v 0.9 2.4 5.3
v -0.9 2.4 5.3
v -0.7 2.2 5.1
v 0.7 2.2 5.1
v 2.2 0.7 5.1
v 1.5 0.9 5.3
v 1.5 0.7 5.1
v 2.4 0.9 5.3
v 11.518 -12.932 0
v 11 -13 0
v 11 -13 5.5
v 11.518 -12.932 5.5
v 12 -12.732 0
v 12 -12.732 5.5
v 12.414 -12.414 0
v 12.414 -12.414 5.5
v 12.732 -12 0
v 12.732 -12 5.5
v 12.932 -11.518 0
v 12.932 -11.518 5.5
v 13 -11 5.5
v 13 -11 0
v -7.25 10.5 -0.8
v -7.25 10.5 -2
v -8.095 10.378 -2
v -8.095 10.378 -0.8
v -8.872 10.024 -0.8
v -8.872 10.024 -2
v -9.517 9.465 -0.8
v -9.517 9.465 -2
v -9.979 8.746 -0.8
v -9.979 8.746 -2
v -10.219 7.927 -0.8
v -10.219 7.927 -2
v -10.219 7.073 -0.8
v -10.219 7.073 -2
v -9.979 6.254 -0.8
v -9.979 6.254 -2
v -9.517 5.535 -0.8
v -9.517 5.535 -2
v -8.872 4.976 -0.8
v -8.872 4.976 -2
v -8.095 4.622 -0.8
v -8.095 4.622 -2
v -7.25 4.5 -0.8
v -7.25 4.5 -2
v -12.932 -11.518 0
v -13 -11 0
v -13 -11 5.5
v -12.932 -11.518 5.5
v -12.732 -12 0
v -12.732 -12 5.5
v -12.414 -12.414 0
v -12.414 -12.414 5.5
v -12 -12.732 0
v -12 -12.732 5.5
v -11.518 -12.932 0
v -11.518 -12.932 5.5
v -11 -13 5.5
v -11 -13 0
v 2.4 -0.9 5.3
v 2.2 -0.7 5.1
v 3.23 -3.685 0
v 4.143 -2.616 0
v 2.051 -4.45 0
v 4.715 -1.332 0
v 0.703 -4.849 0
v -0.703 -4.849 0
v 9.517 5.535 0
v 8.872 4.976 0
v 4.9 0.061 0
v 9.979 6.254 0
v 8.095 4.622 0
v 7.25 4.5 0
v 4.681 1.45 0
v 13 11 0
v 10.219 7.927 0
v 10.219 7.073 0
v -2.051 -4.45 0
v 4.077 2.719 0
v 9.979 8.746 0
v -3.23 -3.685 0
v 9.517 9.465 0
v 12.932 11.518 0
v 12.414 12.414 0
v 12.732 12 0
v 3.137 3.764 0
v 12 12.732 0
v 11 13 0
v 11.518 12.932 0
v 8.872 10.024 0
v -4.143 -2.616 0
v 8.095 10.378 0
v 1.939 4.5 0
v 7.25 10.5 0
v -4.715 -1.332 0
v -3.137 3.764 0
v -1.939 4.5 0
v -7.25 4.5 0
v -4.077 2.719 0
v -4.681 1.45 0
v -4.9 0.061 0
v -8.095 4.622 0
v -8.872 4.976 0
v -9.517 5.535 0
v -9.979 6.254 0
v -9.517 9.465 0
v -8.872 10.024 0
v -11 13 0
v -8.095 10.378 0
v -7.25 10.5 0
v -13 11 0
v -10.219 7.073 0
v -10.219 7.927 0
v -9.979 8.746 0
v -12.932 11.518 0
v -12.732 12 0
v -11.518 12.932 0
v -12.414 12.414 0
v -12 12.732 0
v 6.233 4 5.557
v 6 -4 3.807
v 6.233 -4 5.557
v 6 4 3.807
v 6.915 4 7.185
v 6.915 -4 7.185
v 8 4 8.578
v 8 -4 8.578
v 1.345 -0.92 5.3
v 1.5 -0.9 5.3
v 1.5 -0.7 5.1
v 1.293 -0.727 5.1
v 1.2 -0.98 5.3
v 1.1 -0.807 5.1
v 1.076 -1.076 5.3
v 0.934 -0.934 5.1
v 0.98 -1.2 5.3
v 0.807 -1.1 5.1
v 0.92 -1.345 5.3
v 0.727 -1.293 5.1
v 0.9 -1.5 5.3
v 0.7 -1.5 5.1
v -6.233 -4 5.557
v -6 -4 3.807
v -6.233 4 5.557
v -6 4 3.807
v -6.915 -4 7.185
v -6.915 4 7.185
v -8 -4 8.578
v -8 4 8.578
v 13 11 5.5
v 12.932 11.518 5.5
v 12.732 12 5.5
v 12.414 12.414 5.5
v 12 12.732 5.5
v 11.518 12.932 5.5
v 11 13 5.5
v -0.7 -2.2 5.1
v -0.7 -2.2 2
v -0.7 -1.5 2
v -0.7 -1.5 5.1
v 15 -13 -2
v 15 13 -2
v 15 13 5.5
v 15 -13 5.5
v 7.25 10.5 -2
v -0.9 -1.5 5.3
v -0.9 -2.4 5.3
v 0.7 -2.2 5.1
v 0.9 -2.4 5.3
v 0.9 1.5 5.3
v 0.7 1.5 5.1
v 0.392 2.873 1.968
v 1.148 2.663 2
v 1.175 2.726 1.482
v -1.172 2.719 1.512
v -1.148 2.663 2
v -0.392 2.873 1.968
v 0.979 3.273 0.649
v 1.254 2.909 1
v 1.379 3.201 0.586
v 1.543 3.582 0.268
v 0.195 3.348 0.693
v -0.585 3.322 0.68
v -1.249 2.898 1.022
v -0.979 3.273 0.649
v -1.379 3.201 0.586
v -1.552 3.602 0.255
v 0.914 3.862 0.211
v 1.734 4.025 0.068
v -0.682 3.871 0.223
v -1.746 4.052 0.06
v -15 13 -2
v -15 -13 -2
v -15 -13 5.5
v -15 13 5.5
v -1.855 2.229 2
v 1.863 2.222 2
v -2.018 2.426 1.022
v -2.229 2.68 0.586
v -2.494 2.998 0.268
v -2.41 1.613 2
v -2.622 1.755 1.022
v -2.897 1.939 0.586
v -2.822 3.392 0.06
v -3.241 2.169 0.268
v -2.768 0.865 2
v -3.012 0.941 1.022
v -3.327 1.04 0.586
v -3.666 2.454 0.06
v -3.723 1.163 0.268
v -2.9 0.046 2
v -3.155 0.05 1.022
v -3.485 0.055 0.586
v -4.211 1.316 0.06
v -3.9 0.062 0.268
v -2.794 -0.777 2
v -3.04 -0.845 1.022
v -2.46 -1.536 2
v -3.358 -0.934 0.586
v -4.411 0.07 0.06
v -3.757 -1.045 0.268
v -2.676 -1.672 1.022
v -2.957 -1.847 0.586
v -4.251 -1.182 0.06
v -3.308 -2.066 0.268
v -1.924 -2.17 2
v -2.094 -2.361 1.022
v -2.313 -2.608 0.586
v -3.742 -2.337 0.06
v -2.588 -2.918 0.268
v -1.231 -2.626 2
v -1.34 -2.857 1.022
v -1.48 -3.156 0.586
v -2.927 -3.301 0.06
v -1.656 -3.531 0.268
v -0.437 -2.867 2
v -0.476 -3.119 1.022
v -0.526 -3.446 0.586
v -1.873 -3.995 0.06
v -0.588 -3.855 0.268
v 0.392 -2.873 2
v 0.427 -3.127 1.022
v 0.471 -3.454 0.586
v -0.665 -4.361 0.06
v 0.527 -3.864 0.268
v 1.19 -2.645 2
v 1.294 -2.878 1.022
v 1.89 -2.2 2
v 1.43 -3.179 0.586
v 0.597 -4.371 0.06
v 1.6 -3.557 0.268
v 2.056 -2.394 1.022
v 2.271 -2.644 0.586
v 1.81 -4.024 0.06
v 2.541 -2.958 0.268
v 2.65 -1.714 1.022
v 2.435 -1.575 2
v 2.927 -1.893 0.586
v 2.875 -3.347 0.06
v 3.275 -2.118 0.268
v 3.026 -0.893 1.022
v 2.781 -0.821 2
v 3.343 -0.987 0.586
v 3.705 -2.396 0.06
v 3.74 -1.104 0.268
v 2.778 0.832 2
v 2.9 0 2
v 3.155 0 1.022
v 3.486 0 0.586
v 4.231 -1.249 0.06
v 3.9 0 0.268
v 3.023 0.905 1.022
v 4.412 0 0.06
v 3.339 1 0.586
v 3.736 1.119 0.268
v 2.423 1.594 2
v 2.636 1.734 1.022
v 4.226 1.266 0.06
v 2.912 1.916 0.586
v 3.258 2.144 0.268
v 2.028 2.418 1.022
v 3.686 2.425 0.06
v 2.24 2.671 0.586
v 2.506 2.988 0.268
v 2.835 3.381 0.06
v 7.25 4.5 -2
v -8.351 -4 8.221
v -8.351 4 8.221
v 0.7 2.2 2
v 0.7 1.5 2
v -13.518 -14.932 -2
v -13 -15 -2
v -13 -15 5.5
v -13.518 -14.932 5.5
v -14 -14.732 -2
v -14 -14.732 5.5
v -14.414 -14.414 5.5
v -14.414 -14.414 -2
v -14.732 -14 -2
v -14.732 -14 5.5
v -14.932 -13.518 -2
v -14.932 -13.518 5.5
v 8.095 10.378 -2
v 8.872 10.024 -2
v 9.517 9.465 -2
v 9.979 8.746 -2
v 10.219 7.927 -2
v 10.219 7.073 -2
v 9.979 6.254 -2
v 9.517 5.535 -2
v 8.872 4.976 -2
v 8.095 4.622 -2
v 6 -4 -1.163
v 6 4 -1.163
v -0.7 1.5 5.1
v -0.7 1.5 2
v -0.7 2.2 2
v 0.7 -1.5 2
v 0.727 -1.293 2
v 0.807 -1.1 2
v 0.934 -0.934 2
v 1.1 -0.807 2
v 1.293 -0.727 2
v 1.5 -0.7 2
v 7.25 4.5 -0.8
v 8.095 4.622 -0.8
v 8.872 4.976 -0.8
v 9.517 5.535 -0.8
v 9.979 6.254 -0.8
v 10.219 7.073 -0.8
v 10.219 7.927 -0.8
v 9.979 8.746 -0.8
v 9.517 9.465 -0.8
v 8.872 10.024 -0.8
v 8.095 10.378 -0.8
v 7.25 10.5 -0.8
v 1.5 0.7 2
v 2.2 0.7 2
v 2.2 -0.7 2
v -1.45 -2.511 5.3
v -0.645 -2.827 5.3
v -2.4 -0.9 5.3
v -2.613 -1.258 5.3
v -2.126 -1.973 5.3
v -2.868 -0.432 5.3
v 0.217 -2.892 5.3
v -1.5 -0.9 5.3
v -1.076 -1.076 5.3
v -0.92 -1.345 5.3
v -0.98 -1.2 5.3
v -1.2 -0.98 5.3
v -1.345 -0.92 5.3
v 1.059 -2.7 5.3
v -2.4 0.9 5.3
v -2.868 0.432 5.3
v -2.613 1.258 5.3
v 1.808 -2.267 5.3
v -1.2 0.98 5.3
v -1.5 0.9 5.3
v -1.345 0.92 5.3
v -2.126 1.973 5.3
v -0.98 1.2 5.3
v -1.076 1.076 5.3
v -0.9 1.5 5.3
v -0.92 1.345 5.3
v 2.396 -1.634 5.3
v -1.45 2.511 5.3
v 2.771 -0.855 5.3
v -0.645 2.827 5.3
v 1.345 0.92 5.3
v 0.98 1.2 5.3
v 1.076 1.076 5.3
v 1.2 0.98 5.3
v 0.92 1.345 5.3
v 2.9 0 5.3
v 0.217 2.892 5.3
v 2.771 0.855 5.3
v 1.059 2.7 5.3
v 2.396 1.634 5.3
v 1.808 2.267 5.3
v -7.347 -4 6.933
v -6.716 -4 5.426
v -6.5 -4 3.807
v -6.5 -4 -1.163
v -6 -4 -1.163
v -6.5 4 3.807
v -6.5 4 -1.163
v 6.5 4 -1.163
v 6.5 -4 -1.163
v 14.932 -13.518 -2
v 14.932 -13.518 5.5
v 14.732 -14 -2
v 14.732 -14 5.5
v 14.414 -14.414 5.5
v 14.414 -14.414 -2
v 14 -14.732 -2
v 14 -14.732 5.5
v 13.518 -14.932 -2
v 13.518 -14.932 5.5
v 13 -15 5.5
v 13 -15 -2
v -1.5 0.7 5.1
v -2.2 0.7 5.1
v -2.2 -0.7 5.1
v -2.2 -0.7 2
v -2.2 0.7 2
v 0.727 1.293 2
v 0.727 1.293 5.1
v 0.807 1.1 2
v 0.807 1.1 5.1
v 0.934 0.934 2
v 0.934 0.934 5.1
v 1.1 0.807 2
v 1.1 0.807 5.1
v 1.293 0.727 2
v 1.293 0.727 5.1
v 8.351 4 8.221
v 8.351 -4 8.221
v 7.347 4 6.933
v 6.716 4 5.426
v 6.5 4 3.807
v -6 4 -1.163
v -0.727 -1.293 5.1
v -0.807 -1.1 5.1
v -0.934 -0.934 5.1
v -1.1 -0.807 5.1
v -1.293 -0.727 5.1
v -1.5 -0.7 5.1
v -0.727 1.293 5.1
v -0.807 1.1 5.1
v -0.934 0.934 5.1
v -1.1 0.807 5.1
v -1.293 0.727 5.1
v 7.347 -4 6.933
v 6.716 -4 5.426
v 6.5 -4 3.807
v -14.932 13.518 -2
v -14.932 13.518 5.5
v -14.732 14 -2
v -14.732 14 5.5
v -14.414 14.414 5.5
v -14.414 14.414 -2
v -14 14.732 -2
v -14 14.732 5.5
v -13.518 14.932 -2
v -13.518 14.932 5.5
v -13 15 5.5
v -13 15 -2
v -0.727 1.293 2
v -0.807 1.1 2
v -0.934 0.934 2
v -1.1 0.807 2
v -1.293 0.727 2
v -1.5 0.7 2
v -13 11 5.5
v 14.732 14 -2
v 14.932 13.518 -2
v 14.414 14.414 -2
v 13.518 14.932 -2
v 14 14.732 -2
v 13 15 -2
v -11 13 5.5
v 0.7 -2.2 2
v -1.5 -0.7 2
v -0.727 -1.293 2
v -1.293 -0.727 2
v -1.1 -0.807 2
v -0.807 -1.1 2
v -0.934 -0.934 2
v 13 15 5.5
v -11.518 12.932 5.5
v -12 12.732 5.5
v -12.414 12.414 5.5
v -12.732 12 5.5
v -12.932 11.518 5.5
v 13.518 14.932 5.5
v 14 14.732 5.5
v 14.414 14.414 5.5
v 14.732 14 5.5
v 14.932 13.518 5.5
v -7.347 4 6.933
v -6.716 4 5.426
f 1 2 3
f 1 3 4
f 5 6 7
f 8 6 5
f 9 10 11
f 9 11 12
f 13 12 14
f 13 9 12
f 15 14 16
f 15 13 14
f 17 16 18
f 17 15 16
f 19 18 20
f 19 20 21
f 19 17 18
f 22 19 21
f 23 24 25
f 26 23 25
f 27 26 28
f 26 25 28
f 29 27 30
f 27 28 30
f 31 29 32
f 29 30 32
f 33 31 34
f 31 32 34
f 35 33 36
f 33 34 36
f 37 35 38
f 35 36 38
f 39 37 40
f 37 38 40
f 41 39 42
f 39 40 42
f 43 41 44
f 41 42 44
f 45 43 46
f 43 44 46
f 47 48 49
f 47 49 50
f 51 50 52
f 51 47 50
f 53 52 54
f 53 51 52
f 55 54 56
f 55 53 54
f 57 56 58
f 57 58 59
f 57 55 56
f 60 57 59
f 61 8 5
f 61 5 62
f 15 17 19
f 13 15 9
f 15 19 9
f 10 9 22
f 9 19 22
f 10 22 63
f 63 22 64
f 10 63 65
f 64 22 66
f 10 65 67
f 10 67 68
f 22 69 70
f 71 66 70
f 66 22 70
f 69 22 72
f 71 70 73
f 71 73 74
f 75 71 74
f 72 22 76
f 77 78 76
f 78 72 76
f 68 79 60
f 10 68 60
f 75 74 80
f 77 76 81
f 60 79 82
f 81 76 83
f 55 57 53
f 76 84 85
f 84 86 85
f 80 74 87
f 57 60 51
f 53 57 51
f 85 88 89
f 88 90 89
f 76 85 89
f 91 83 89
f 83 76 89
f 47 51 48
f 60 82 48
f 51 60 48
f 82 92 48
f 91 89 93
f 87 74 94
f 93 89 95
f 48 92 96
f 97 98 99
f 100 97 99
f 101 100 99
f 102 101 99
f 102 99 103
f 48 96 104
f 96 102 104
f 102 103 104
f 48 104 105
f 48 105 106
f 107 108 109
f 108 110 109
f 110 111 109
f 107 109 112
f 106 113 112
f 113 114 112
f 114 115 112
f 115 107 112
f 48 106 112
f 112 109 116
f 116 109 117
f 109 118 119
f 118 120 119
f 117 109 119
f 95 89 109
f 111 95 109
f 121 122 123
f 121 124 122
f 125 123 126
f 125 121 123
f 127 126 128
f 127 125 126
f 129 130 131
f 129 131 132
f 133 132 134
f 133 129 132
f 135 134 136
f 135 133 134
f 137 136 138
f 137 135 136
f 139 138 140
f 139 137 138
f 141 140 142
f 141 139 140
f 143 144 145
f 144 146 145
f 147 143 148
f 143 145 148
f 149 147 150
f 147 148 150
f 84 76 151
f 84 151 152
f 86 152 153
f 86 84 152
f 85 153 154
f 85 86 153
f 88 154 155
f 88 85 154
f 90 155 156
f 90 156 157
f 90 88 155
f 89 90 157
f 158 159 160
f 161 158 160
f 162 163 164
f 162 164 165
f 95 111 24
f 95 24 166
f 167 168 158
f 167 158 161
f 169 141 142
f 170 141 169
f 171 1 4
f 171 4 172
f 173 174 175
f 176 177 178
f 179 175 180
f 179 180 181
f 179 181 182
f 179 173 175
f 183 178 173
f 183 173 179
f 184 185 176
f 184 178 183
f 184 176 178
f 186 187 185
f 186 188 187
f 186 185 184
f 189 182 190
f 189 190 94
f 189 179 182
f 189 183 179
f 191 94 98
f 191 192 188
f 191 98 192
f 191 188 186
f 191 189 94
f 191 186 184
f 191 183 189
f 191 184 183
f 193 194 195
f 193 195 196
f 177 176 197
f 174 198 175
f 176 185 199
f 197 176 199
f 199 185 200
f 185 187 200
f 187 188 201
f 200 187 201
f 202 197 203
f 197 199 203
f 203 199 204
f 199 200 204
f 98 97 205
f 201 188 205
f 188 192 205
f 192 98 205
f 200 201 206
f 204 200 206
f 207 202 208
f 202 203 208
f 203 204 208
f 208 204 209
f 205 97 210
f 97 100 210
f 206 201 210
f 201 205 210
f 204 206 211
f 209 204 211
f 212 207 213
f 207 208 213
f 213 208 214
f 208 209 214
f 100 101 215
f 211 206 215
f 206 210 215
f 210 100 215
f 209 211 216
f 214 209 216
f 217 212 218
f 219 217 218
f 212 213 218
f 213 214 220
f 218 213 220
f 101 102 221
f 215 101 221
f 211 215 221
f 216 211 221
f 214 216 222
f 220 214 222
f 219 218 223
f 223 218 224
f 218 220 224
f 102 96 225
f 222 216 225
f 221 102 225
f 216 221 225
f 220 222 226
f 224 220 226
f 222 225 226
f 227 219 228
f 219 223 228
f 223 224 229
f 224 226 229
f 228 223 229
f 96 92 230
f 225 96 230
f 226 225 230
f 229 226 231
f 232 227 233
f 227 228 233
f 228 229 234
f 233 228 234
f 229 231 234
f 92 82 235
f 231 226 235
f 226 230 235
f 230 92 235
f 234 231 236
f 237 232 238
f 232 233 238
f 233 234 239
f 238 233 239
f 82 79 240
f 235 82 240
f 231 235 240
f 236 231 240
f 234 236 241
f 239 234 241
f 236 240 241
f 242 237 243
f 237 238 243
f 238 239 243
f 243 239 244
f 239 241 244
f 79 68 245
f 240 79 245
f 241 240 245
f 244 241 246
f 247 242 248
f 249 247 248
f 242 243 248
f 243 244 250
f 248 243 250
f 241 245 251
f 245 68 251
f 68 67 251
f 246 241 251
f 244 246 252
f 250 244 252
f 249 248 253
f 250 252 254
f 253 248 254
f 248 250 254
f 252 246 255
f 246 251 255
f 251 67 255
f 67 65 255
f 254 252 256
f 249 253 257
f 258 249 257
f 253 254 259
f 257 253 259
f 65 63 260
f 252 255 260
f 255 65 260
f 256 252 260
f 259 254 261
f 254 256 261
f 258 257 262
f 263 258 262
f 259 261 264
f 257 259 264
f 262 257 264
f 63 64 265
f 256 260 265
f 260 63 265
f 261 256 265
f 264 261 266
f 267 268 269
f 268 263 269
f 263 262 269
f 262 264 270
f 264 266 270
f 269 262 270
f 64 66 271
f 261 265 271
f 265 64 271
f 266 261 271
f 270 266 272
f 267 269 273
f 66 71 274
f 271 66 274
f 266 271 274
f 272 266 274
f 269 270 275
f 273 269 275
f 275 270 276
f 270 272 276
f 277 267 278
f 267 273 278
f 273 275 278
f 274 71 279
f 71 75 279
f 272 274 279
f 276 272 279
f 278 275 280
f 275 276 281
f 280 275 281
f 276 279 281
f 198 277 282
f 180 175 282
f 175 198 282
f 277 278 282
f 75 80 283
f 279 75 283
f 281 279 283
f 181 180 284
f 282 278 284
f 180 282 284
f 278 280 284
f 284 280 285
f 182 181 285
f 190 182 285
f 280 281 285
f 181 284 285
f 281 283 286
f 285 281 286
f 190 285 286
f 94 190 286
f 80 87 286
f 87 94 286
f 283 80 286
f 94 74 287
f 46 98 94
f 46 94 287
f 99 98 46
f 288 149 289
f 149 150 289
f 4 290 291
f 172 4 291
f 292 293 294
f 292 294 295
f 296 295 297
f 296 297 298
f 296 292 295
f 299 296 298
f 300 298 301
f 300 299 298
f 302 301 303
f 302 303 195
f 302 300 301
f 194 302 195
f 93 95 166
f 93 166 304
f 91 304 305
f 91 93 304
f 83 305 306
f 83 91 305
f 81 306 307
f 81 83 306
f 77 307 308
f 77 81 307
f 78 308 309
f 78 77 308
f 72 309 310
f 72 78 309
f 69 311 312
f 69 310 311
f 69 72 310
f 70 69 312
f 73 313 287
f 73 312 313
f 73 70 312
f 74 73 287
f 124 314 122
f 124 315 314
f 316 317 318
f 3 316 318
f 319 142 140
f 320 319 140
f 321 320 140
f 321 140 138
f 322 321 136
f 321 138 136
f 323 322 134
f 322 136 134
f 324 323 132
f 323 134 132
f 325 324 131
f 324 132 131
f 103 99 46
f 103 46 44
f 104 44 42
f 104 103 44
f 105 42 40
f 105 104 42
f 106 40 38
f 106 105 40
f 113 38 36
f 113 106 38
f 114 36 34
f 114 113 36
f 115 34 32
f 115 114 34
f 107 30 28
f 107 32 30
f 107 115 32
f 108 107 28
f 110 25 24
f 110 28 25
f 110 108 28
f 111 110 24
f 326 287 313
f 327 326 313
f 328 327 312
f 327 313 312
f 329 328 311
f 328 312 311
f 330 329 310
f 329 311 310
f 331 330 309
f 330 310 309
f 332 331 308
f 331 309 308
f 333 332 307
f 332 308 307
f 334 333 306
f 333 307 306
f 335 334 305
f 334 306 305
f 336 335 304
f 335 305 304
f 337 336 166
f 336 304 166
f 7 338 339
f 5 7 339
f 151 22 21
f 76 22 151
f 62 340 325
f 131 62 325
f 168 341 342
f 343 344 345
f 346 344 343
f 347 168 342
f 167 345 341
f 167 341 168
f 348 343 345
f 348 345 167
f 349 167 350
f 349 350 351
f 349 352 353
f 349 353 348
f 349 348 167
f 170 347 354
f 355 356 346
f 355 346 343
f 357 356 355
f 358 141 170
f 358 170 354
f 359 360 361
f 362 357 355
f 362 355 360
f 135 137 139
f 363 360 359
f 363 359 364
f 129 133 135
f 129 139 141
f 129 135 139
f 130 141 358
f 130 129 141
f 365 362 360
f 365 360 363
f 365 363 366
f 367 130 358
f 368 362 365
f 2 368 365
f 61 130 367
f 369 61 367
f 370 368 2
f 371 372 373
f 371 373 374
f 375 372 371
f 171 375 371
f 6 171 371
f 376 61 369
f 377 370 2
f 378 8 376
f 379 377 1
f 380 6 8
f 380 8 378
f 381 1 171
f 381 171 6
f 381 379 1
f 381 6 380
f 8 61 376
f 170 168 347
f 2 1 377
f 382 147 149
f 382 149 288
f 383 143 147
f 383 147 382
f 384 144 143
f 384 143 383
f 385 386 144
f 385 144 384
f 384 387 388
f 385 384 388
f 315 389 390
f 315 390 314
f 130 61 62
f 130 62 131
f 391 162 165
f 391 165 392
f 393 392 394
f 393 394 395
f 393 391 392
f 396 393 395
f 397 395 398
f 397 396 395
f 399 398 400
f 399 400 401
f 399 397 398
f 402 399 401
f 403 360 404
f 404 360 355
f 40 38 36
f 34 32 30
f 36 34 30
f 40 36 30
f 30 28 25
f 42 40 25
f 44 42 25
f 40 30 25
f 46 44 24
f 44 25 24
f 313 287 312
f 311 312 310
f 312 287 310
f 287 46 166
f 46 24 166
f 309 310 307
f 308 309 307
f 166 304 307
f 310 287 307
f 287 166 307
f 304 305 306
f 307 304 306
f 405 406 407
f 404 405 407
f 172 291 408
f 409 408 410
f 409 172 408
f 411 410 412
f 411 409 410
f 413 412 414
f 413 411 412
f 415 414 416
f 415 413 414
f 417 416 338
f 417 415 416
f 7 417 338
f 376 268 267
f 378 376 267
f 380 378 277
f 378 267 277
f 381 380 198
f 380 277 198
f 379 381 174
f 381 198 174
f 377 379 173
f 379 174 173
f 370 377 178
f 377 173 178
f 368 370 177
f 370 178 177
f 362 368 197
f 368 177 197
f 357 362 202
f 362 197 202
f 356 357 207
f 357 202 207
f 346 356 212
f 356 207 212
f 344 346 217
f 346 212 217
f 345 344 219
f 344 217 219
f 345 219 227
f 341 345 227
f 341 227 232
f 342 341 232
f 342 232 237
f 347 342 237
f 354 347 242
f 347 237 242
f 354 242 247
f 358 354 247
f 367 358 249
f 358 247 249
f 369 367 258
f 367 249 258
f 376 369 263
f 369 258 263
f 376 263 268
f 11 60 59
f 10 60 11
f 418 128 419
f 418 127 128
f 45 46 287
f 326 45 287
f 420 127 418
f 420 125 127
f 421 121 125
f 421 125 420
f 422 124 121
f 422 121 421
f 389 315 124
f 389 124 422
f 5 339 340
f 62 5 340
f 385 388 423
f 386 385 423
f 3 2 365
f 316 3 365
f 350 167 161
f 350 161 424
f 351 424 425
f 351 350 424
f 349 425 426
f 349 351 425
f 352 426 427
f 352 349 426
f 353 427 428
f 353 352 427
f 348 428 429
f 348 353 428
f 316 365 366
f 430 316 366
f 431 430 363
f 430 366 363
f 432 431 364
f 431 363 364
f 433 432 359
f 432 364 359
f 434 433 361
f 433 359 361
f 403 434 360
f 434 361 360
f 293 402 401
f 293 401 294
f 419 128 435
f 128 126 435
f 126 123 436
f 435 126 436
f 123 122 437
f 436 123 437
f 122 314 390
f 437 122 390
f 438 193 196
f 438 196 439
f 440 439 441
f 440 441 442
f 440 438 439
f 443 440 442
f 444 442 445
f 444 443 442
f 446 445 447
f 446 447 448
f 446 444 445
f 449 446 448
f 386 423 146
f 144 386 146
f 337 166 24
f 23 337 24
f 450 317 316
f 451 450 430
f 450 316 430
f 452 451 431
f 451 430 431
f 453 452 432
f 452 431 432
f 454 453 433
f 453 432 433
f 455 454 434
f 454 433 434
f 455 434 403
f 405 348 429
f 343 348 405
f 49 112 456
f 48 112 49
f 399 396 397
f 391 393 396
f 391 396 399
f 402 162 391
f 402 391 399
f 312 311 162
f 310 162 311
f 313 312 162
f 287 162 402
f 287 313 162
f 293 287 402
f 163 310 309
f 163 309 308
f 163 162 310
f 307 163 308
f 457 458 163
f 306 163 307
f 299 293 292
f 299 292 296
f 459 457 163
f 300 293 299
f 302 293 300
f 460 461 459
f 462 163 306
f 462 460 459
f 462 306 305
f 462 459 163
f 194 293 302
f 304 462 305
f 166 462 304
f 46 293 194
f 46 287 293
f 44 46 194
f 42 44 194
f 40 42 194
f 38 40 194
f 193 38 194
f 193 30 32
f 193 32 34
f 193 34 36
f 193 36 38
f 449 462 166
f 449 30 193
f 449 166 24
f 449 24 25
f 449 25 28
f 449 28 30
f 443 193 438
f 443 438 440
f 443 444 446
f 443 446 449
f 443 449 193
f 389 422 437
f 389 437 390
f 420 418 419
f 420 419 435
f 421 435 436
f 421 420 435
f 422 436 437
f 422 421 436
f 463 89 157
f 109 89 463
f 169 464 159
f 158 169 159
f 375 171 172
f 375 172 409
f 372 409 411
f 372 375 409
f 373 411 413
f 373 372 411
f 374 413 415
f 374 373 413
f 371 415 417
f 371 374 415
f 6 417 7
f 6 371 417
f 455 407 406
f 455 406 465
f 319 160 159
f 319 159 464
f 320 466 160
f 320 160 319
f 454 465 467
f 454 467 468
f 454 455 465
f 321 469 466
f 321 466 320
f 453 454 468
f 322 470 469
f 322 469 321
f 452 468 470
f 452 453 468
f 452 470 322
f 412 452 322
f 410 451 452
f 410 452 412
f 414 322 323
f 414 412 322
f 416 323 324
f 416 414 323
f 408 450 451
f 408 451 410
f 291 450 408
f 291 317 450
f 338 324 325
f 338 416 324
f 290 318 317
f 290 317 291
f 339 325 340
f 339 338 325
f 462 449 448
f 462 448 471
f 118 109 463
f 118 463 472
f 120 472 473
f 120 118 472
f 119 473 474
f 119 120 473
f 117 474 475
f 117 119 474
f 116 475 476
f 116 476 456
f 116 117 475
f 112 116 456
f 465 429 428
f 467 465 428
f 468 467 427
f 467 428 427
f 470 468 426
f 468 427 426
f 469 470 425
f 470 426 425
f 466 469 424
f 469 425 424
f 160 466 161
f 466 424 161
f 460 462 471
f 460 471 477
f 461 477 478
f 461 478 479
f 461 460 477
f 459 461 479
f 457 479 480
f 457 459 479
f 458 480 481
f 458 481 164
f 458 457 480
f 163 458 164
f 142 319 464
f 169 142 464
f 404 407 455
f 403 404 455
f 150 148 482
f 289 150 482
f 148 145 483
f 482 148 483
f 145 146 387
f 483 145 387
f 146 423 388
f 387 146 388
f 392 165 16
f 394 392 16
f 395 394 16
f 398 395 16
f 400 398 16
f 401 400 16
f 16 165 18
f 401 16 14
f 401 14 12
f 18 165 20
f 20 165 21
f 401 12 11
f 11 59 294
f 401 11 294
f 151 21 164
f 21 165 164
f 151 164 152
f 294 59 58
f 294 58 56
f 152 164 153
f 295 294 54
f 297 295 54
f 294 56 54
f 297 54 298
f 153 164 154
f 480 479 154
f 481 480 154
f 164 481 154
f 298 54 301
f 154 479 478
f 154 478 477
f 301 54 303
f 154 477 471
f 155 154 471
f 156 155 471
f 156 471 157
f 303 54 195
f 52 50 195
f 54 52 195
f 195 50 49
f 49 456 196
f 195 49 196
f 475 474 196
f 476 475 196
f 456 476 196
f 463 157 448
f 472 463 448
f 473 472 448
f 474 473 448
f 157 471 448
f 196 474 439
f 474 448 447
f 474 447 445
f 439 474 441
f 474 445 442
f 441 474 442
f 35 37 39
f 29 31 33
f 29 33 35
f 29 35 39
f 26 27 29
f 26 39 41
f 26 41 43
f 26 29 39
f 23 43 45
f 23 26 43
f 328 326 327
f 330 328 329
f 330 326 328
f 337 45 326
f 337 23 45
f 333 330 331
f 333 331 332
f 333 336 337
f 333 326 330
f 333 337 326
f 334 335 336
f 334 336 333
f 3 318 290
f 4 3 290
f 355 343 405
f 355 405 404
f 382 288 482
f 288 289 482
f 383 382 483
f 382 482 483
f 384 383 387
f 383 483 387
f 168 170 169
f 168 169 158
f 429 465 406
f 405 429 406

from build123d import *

# Parameters (mm, degrees)
EXTRUDE_1_DEPTH     = 5.5
SKETCH_1_6_R        = 2.9
EXTRUDE_2_DEPTH     = 5.3
EXTRUDE_START       = -2
EXTRUDE_3_DEPTH     = 2
EXTRUDE_4_DEPTH     = 2
CUT_EXTRUDE_1_REACH = 23.915
EXTRUDE_6_DEPTH     = 1.2
EXTRUDE_9_DEPTH     = 4
EXTRUDE_9_2_DEPTH   = 4
FILLET_4_R          = 0.8
CHAMFER_1_SIZE      = 0.2
FILLET_5_R          = 2


with BuildPart() as part:
    # 草图1 → 凸台-拉伸1 (new body)
    with BuildSketch(Plane.XY):
        with BuildLine():
            ThreePointArc((-15, 13), (-14.414213562, 14.414213562), (-13, 15))
            Line((-13, 15), (13, 15))
            ThreePointArc((13, 15), (14.414213562, 14.414213562), (15, 13))
            Line((15, 13), (15, -13))
            ThreePointArc((15, -13), (14.414213562, -14.414213562), (13, -15))
            Line((13, -15), (-13, -15))
            ThreePointArc((-13, -15), (-14.414213562, -14.414213562), (-15, -13))
            Line((-15, -13), (-15, 13))
        make_face()
        with BuildLine():
            ThreePointArc((-13, -11), (-12.414213562, -12.414213562), (-11, -13))
            Line((-11, -13), (11, -13))
            ThreePointArc((11, -13), (12.414213562, -12.414213562), (13, -11))
            Line((13, -11), (13, 11))
            ThreePointArc((13, 11), (12.414213562, 12.414213562), (11, 13))
            Line((11, 13), (-11, 13))
            ThreePointArc((-11, 13), (-12.414213562, 12.414213562), (-13, 11))
            Line((-13, 11), (-13, -11))
        make_face(mode=Mode.SUBTRACT)
    extrude(amount=EXTRUDE_1_DEPTH)



with BuildPart() as body_2:
    # 草图1<6> → 凸台-拉伸2 (new body)
    with BuildSketch(Plane.XY):
        Circle(SKETCH_1_6_R)
        Polygon((-2.2, -0.7), (-2.2, 0.7), (-0.7, 0.7), (-0.7, 2.2), (0.7, 2.2), (0.7, 0.7), (2.2, 0.7), (2.2, -0.7), (0.7, -0.7), (0.7, -2.2), (-0.7, -2.2), (-0.7, -0.7), align=None, mode=Mode.SUBTRACT)
    extrude(amount=EXTRUDE_2_DEPTH)


with BuildPart() as part_1:
    add(part.part)

    add(body_2.part)  # 凸台-拉伸3 merges body 2
    # 草图1<7> → 凸台-拉伸3 (add)
    with BuildSketch(Plane.XY.offset(EXTRUDE_START)):
        with BuildLine():
            Line((-13, 15), (13, 15))
            ThreePointArc((13, 15), (14.414213562, 14.414213562), (15, 13))
            Line((15, 13), (15, -13))
            ThreePointArc((15, -13), (14.414213562, -14.414213562), (13, -15))
            Line((13, -15), (-13, -15))
            ThreePointArc((-13, -15), (-14.414213562, -14.414213562), (-15, -13))
            Line((-15, -13), (-15, 13))
            ThreePointArc((-15, 13), (-14.414213562, 14.414213562), (-13, 15))
        make_face()
    extrude(amount=EXTRUDE_3_DEPTH)

    # 草图3 → 凸台-拉伸4 (add)
    with BuildSketch(Plane.XY):
        Polygon((0.7, 0.7), (0.7, 2.2), (-0.7, 2.2), (-0.7, 0.7), (-2.2, 0.7), (-2.2, -0.7), (-0.7, -0.7), (-0.7, -2.2), (0.7, -2.2), (0.7, -0.7), (2.2, -0.7), (2.2, 0.7), align=None)
    extrude(amount=EXTRUDE_4_DEPTH)

    # 草图5 → 切除-拉伸1 (cut, up to next)
    with BuildSketch(Plane.XY, mode=Mode.PRIVATE) as cut_extrude_1_sk1:
        with BuildLine():
            Line((7.25, 4.5), (-7.25, 4.5))
            ThreePointArc((-7.25, 4.5), (-10.25, 7.5), (-7.25, 10.5))
            Line((-7.25, 10.5), (7.25, 10.5))
            ThreePointArc((7.25, 10.5), (10.25, 7.5), (7.25, 4.5))
        make_face()
    cut_extrude_1_tool1 = extrude(cut_extrude_1_sk1.sketch, amount=-CUT_EXTRUDE_1_REACH, mode=Mode.PRIVATE) & part_1.part
    add(cut_extrude_1_tool1.solids().sort_by_distance((0, 7.5, 0))[0], mode=Mode.SUBTRACT)

    # 圆角4
    fillet_4_edges = [part_1.edges().sort_by_distance(p)[0] for p in [
        (0.7, 0.7, 3.65),
        (0.7, -0.7, 3.65),
        (-0.7, -0.7, 3.65),
        (-0.7, 0.7, 3.65),
    ]]
    fillet(fillet_4_edges, radius=FILLET_4_R)

    # 倒角1
    chamfer_1_edges = [part_1.edges().sort_by_distance(p)[0] for p in [
        (1.85, 0.7, 5.3),
        (1.85, -0.7, 5.3),
        (0.7, -1.85, 5.3),
        (-0.7, -1.85, 5.3),
        (0.934314575, -0.934314575, 5.3),
        (-0.934314575, -0.934314575, 5.3),
        (0.934314575, 0.934314575, 5.3),
        (-0.934314575, 0.934314575, 5.3),
        (0, -2.2, 5.3),
        (-1.85, -0.7, 5.3),
        (-2.2, 0, 5.3),
        (-0.7, 1.85, 5.3),
        (0, 2.2, 5.3),
        (0.7, 1.85, 5.3),
        (2.2, 0, 5.3),
        (-1.85, 0.7, 5.3),
    ]]
    chamfer(chamfer_1_edges, length=CHAMFER_1_SIZE)

    # 圆角5
    fillet_5_edges = [part_1.edges().sort_by_distance(p)[0] for p in [
        (-2.9, 0, 0),
    ]]
    fillet(fillet_5_edges, radius=FILLET_5_R)


with BuildPart() as body_2_2:
    # 草图6 → 凸台-拉伸6 (new body)
    with BuildSketch(Plane(origin=(0, 0, -2), x_dir=(-1, 0, 0), z_dir=(0, 0, -1))):
        with BuildLine():
            Line((7.25, 4.5), (-7.25, 4.5))
            ThreePointArc((-7.25, 4.5), (-10.25, 7.5), (-7.25, 10.5))
            Line((-7.25, 10.5), (7.25, 10.5))
            ThreePointArc((7.25, 10.5), (10.25, 7.5), (7.25, 4.5))
        make_face()
    extrude(amount=-EXTRUDE_6_DEPTH)


with BuildPart() as body_3:
    # 草图9 → 凸台-拉伸9 (new, symmetric)
    with BuildSketch(Plane(origin=(0, 0, 0), x_dir=(1, 0, 0), z_dir=(0, 1, 0))):
        with BuildLine():
            Line((8, -8.577982298), (8.350542857, -8.221443794))
            ThreePointArc((8.350542857, -8.221443794), (6.981348422, -6.200244031), (6.5, -3.806868679))
            Line((6.5, -3.806868679), (6.5, 1.163381533))
            Line((6.5, 1.163381533), (6, 1.163381533))
            Line((6, 1.163381533), (6, -3.806868679))
            ThreePointArc((6, -3.806868679), (6.52022402, -6.393542468), (8, -8.577982298))
        make_face()
    extrude(amount=EXTRUDE_9_DEPTH, both=True)


with BuildPart() as body_4:
    # 草图9 → Extrude 9 2 (new, symmetric)
    with BuildSketch(Plane(origin=(0, 0, 0), x_dir=(1, 0, 0), z_dir=(0, 1, 0))):
        with BuildLine():
            Line((-6, 1.163381533), (-6, -3.806868679))
            ThreePointArc((-6, -3.806868679), (-6.52022402, -6.393542468), (-8, -8.577982298))
            Line((-8, -8.577982298), (-8.350542857, -8.221443794))
            ThreePointArc((-8.350542857, -8.221443794), (-6.981348422, -6.200244031), (-6.5, -3.806868679))
            Line((-6.5, -3.806868679), (-6.5, 1.163381533))
            Line((-6.5, 1.163381533), (-6, 1.163381533))
        make_face()
    extrude(amount=EXTRUDE_9_2_DEPTH, both=True)


solid = Compound([part_1.part, body_2_2.part, body_3.part, body_4.part])
